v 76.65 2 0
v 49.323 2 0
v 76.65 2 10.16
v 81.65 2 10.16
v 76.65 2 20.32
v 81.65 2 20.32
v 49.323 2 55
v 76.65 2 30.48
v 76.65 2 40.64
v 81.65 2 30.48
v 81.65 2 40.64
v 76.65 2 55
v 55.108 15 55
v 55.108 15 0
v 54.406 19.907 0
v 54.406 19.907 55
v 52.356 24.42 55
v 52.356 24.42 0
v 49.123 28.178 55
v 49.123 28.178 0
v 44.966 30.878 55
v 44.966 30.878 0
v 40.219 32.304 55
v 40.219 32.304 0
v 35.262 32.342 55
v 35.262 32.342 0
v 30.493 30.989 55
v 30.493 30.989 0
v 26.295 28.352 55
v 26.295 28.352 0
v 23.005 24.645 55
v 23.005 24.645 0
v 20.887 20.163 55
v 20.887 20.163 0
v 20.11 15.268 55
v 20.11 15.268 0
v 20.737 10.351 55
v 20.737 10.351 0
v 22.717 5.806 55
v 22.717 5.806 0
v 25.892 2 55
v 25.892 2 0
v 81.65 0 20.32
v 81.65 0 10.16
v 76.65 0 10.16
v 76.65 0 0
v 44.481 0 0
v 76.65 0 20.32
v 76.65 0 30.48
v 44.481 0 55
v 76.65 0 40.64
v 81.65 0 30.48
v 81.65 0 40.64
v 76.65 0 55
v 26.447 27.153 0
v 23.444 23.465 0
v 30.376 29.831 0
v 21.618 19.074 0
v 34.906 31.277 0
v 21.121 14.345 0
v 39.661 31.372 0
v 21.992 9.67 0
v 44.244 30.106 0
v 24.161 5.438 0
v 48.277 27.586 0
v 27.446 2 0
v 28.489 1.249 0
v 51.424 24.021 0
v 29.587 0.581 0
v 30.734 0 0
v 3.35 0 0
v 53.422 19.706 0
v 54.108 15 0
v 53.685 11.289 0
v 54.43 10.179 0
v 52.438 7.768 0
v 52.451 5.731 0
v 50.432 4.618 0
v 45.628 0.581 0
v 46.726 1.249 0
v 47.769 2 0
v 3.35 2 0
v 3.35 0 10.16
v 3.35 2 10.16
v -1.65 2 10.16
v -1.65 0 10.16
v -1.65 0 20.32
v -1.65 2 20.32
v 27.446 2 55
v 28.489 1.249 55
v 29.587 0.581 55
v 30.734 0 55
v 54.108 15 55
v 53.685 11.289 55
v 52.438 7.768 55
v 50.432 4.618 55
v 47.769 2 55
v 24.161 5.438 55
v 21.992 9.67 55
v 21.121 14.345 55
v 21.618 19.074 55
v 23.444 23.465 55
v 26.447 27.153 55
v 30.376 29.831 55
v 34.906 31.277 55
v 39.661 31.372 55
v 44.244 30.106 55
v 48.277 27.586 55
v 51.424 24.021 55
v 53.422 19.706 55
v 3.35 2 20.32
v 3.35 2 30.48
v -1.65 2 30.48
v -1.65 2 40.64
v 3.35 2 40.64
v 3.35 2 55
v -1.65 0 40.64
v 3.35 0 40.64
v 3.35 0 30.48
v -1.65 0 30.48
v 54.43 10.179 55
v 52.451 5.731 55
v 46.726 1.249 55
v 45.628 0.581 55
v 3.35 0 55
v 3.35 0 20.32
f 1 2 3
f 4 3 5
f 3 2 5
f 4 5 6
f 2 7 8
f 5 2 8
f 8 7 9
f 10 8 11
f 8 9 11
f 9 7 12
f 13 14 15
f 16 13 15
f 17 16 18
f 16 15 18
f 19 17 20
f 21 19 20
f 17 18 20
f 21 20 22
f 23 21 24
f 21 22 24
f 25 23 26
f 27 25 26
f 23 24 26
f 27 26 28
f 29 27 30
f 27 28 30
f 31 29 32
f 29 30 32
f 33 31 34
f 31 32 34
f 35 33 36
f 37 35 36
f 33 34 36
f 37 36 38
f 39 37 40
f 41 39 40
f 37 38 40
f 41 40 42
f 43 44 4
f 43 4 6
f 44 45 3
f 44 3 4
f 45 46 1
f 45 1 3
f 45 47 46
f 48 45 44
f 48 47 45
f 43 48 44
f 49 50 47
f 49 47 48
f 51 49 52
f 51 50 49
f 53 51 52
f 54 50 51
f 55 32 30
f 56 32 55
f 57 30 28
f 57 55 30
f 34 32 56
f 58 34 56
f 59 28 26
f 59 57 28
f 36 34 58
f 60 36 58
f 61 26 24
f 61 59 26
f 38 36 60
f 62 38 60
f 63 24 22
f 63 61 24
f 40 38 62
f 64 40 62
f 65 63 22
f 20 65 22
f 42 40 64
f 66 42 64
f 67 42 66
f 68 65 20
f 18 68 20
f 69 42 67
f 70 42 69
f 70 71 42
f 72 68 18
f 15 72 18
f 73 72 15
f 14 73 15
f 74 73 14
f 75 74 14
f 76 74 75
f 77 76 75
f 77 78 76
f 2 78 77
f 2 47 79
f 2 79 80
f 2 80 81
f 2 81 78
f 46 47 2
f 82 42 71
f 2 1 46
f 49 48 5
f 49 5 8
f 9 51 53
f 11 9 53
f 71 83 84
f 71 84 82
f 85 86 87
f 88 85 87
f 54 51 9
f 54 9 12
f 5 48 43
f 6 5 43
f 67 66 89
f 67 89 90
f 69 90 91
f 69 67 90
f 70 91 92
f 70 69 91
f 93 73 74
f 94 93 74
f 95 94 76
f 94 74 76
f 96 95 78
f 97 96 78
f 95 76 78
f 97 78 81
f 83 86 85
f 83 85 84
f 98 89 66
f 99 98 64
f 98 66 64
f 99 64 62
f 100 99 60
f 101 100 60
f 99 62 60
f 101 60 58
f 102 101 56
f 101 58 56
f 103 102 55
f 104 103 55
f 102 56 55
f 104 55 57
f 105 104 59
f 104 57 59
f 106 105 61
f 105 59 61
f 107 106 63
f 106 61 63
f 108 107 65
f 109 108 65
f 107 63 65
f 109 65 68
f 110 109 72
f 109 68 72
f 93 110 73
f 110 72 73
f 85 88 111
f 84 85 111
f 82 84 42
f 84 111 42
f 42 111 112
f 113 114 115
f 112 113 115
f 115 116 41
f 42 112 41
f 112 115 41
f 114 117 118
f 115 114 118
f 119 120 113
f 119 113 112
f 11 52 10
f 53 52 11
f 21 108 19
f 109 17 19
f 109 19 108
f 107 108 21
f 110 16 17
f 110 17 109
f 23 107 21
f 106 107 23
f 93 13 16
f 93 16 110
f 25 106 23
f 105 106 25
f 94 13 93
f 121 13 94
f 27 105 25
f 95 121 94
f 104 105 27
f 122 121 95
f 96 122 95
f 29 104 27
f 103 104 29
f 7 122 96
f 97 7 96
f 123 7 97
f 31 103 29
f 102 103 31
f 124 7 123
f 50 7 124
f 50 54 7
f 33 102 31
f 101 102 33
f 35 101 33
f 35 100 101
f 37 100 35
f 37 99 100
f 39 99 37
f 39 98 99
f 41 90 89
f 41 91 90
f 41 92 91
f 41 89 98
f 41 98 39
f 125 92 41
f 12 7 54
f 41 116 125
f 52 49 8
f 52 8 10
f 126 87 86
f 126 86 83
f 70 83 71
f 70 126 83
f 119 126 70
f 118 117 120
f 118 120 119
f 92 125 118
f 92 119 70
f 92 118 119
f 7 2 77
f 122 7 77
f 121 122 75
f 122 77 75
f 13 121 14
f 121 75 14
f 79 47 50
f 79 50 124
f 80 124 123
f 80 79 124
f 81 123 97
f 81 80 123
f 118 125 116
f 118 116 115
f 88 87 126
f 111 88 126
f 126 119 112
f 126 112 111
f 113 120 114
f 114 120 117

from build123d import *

# Parameters (mm, degrees)
F0_W     = 5
F0_H     = 10.16
F1_DEPTH = 2
F3_DEPTH = 55
F4_DEPTH = 55


with BuildPart() as f1:
    # F0 (on Front) → F1 (new body)
    with BuildSketch(Plane.XZ):
        Polygon((3.35, 0), (3.75, 0), (76.25, 0), (76.65, 0), (76.65, 10.16), (76.65, 20.32), (76.65, 30.48), (76.65, 40.64), (76.65, 55), (3.35, 55), (3.35, 40.64), (3.35, 30.48), (3.35, 20.32), (3.35, 10.16), align=None)
        with Locations((0.85, 15.24)):
            Rectangle(F0_W, F0_H)
        with Locations((79.15, 15.24)):
            Rectangle(F0_W, F0_H)
        with Locations((0.85, 35.56)):
            Rectangle(F0_W, F0_H)
        with Locations((79.15, 35.56)):
            Rectangle(F0_W, F0_H)
    extrude(amount=-F1_DEPTH)

    # F2 (on Top) → F3 (join)
    with BuildSketch(Plane.XY):
        with BuildLine():
            ThreePointArc((27.4464156413, 2), (30.3760816597, 29.8308767748), (54.1076163577, 15))
            ThreePointArc((54.1076163577, 15), (52.4384931326, 7.7684653019), (47.7688170742, 2))
            Line((47.7688170742, 2), (49.3229908716, 2))
            ThreePointArc((49.3229908716, 2), (53.5961912472, 7.8855447852), (55.1076163577, 15))
            ThreePointArc((55.1076163577, 15), (30.4931611429, 30.9885748895), (25.8922418439, 2))
            Line((25.8922418439, 2), (27.4464156413, 2))
        make_face()
    extrude(amount=F3_DEPTH)

    # F2 (on Top) → F4 (cut)
    with BuildSketch(Plane.XY):
        with BuildLine():
            Line((37.6076163577, 2), (27.4464156413, 2))
            ThreePointArc((27.4464156413, 2), (29.0315826838, 0.9038428491), (30.7337528153, 0))
            Line((30.7337528153, 0), (37.6076163577, 0))
            Line((37.6076163577, 0), (44.4814799001, 0))
            ThreePointArc((44.4814799001, 0), (46.1836500316, 0.9038428491), (47.7688170742, 2))
            Line((47.7688170742, 2), (37.6076163577, 2))
        make_face()
    extrude(amount=F4_DEPTH, mode=Mode.SUBTRACT)


solid = f1.part
